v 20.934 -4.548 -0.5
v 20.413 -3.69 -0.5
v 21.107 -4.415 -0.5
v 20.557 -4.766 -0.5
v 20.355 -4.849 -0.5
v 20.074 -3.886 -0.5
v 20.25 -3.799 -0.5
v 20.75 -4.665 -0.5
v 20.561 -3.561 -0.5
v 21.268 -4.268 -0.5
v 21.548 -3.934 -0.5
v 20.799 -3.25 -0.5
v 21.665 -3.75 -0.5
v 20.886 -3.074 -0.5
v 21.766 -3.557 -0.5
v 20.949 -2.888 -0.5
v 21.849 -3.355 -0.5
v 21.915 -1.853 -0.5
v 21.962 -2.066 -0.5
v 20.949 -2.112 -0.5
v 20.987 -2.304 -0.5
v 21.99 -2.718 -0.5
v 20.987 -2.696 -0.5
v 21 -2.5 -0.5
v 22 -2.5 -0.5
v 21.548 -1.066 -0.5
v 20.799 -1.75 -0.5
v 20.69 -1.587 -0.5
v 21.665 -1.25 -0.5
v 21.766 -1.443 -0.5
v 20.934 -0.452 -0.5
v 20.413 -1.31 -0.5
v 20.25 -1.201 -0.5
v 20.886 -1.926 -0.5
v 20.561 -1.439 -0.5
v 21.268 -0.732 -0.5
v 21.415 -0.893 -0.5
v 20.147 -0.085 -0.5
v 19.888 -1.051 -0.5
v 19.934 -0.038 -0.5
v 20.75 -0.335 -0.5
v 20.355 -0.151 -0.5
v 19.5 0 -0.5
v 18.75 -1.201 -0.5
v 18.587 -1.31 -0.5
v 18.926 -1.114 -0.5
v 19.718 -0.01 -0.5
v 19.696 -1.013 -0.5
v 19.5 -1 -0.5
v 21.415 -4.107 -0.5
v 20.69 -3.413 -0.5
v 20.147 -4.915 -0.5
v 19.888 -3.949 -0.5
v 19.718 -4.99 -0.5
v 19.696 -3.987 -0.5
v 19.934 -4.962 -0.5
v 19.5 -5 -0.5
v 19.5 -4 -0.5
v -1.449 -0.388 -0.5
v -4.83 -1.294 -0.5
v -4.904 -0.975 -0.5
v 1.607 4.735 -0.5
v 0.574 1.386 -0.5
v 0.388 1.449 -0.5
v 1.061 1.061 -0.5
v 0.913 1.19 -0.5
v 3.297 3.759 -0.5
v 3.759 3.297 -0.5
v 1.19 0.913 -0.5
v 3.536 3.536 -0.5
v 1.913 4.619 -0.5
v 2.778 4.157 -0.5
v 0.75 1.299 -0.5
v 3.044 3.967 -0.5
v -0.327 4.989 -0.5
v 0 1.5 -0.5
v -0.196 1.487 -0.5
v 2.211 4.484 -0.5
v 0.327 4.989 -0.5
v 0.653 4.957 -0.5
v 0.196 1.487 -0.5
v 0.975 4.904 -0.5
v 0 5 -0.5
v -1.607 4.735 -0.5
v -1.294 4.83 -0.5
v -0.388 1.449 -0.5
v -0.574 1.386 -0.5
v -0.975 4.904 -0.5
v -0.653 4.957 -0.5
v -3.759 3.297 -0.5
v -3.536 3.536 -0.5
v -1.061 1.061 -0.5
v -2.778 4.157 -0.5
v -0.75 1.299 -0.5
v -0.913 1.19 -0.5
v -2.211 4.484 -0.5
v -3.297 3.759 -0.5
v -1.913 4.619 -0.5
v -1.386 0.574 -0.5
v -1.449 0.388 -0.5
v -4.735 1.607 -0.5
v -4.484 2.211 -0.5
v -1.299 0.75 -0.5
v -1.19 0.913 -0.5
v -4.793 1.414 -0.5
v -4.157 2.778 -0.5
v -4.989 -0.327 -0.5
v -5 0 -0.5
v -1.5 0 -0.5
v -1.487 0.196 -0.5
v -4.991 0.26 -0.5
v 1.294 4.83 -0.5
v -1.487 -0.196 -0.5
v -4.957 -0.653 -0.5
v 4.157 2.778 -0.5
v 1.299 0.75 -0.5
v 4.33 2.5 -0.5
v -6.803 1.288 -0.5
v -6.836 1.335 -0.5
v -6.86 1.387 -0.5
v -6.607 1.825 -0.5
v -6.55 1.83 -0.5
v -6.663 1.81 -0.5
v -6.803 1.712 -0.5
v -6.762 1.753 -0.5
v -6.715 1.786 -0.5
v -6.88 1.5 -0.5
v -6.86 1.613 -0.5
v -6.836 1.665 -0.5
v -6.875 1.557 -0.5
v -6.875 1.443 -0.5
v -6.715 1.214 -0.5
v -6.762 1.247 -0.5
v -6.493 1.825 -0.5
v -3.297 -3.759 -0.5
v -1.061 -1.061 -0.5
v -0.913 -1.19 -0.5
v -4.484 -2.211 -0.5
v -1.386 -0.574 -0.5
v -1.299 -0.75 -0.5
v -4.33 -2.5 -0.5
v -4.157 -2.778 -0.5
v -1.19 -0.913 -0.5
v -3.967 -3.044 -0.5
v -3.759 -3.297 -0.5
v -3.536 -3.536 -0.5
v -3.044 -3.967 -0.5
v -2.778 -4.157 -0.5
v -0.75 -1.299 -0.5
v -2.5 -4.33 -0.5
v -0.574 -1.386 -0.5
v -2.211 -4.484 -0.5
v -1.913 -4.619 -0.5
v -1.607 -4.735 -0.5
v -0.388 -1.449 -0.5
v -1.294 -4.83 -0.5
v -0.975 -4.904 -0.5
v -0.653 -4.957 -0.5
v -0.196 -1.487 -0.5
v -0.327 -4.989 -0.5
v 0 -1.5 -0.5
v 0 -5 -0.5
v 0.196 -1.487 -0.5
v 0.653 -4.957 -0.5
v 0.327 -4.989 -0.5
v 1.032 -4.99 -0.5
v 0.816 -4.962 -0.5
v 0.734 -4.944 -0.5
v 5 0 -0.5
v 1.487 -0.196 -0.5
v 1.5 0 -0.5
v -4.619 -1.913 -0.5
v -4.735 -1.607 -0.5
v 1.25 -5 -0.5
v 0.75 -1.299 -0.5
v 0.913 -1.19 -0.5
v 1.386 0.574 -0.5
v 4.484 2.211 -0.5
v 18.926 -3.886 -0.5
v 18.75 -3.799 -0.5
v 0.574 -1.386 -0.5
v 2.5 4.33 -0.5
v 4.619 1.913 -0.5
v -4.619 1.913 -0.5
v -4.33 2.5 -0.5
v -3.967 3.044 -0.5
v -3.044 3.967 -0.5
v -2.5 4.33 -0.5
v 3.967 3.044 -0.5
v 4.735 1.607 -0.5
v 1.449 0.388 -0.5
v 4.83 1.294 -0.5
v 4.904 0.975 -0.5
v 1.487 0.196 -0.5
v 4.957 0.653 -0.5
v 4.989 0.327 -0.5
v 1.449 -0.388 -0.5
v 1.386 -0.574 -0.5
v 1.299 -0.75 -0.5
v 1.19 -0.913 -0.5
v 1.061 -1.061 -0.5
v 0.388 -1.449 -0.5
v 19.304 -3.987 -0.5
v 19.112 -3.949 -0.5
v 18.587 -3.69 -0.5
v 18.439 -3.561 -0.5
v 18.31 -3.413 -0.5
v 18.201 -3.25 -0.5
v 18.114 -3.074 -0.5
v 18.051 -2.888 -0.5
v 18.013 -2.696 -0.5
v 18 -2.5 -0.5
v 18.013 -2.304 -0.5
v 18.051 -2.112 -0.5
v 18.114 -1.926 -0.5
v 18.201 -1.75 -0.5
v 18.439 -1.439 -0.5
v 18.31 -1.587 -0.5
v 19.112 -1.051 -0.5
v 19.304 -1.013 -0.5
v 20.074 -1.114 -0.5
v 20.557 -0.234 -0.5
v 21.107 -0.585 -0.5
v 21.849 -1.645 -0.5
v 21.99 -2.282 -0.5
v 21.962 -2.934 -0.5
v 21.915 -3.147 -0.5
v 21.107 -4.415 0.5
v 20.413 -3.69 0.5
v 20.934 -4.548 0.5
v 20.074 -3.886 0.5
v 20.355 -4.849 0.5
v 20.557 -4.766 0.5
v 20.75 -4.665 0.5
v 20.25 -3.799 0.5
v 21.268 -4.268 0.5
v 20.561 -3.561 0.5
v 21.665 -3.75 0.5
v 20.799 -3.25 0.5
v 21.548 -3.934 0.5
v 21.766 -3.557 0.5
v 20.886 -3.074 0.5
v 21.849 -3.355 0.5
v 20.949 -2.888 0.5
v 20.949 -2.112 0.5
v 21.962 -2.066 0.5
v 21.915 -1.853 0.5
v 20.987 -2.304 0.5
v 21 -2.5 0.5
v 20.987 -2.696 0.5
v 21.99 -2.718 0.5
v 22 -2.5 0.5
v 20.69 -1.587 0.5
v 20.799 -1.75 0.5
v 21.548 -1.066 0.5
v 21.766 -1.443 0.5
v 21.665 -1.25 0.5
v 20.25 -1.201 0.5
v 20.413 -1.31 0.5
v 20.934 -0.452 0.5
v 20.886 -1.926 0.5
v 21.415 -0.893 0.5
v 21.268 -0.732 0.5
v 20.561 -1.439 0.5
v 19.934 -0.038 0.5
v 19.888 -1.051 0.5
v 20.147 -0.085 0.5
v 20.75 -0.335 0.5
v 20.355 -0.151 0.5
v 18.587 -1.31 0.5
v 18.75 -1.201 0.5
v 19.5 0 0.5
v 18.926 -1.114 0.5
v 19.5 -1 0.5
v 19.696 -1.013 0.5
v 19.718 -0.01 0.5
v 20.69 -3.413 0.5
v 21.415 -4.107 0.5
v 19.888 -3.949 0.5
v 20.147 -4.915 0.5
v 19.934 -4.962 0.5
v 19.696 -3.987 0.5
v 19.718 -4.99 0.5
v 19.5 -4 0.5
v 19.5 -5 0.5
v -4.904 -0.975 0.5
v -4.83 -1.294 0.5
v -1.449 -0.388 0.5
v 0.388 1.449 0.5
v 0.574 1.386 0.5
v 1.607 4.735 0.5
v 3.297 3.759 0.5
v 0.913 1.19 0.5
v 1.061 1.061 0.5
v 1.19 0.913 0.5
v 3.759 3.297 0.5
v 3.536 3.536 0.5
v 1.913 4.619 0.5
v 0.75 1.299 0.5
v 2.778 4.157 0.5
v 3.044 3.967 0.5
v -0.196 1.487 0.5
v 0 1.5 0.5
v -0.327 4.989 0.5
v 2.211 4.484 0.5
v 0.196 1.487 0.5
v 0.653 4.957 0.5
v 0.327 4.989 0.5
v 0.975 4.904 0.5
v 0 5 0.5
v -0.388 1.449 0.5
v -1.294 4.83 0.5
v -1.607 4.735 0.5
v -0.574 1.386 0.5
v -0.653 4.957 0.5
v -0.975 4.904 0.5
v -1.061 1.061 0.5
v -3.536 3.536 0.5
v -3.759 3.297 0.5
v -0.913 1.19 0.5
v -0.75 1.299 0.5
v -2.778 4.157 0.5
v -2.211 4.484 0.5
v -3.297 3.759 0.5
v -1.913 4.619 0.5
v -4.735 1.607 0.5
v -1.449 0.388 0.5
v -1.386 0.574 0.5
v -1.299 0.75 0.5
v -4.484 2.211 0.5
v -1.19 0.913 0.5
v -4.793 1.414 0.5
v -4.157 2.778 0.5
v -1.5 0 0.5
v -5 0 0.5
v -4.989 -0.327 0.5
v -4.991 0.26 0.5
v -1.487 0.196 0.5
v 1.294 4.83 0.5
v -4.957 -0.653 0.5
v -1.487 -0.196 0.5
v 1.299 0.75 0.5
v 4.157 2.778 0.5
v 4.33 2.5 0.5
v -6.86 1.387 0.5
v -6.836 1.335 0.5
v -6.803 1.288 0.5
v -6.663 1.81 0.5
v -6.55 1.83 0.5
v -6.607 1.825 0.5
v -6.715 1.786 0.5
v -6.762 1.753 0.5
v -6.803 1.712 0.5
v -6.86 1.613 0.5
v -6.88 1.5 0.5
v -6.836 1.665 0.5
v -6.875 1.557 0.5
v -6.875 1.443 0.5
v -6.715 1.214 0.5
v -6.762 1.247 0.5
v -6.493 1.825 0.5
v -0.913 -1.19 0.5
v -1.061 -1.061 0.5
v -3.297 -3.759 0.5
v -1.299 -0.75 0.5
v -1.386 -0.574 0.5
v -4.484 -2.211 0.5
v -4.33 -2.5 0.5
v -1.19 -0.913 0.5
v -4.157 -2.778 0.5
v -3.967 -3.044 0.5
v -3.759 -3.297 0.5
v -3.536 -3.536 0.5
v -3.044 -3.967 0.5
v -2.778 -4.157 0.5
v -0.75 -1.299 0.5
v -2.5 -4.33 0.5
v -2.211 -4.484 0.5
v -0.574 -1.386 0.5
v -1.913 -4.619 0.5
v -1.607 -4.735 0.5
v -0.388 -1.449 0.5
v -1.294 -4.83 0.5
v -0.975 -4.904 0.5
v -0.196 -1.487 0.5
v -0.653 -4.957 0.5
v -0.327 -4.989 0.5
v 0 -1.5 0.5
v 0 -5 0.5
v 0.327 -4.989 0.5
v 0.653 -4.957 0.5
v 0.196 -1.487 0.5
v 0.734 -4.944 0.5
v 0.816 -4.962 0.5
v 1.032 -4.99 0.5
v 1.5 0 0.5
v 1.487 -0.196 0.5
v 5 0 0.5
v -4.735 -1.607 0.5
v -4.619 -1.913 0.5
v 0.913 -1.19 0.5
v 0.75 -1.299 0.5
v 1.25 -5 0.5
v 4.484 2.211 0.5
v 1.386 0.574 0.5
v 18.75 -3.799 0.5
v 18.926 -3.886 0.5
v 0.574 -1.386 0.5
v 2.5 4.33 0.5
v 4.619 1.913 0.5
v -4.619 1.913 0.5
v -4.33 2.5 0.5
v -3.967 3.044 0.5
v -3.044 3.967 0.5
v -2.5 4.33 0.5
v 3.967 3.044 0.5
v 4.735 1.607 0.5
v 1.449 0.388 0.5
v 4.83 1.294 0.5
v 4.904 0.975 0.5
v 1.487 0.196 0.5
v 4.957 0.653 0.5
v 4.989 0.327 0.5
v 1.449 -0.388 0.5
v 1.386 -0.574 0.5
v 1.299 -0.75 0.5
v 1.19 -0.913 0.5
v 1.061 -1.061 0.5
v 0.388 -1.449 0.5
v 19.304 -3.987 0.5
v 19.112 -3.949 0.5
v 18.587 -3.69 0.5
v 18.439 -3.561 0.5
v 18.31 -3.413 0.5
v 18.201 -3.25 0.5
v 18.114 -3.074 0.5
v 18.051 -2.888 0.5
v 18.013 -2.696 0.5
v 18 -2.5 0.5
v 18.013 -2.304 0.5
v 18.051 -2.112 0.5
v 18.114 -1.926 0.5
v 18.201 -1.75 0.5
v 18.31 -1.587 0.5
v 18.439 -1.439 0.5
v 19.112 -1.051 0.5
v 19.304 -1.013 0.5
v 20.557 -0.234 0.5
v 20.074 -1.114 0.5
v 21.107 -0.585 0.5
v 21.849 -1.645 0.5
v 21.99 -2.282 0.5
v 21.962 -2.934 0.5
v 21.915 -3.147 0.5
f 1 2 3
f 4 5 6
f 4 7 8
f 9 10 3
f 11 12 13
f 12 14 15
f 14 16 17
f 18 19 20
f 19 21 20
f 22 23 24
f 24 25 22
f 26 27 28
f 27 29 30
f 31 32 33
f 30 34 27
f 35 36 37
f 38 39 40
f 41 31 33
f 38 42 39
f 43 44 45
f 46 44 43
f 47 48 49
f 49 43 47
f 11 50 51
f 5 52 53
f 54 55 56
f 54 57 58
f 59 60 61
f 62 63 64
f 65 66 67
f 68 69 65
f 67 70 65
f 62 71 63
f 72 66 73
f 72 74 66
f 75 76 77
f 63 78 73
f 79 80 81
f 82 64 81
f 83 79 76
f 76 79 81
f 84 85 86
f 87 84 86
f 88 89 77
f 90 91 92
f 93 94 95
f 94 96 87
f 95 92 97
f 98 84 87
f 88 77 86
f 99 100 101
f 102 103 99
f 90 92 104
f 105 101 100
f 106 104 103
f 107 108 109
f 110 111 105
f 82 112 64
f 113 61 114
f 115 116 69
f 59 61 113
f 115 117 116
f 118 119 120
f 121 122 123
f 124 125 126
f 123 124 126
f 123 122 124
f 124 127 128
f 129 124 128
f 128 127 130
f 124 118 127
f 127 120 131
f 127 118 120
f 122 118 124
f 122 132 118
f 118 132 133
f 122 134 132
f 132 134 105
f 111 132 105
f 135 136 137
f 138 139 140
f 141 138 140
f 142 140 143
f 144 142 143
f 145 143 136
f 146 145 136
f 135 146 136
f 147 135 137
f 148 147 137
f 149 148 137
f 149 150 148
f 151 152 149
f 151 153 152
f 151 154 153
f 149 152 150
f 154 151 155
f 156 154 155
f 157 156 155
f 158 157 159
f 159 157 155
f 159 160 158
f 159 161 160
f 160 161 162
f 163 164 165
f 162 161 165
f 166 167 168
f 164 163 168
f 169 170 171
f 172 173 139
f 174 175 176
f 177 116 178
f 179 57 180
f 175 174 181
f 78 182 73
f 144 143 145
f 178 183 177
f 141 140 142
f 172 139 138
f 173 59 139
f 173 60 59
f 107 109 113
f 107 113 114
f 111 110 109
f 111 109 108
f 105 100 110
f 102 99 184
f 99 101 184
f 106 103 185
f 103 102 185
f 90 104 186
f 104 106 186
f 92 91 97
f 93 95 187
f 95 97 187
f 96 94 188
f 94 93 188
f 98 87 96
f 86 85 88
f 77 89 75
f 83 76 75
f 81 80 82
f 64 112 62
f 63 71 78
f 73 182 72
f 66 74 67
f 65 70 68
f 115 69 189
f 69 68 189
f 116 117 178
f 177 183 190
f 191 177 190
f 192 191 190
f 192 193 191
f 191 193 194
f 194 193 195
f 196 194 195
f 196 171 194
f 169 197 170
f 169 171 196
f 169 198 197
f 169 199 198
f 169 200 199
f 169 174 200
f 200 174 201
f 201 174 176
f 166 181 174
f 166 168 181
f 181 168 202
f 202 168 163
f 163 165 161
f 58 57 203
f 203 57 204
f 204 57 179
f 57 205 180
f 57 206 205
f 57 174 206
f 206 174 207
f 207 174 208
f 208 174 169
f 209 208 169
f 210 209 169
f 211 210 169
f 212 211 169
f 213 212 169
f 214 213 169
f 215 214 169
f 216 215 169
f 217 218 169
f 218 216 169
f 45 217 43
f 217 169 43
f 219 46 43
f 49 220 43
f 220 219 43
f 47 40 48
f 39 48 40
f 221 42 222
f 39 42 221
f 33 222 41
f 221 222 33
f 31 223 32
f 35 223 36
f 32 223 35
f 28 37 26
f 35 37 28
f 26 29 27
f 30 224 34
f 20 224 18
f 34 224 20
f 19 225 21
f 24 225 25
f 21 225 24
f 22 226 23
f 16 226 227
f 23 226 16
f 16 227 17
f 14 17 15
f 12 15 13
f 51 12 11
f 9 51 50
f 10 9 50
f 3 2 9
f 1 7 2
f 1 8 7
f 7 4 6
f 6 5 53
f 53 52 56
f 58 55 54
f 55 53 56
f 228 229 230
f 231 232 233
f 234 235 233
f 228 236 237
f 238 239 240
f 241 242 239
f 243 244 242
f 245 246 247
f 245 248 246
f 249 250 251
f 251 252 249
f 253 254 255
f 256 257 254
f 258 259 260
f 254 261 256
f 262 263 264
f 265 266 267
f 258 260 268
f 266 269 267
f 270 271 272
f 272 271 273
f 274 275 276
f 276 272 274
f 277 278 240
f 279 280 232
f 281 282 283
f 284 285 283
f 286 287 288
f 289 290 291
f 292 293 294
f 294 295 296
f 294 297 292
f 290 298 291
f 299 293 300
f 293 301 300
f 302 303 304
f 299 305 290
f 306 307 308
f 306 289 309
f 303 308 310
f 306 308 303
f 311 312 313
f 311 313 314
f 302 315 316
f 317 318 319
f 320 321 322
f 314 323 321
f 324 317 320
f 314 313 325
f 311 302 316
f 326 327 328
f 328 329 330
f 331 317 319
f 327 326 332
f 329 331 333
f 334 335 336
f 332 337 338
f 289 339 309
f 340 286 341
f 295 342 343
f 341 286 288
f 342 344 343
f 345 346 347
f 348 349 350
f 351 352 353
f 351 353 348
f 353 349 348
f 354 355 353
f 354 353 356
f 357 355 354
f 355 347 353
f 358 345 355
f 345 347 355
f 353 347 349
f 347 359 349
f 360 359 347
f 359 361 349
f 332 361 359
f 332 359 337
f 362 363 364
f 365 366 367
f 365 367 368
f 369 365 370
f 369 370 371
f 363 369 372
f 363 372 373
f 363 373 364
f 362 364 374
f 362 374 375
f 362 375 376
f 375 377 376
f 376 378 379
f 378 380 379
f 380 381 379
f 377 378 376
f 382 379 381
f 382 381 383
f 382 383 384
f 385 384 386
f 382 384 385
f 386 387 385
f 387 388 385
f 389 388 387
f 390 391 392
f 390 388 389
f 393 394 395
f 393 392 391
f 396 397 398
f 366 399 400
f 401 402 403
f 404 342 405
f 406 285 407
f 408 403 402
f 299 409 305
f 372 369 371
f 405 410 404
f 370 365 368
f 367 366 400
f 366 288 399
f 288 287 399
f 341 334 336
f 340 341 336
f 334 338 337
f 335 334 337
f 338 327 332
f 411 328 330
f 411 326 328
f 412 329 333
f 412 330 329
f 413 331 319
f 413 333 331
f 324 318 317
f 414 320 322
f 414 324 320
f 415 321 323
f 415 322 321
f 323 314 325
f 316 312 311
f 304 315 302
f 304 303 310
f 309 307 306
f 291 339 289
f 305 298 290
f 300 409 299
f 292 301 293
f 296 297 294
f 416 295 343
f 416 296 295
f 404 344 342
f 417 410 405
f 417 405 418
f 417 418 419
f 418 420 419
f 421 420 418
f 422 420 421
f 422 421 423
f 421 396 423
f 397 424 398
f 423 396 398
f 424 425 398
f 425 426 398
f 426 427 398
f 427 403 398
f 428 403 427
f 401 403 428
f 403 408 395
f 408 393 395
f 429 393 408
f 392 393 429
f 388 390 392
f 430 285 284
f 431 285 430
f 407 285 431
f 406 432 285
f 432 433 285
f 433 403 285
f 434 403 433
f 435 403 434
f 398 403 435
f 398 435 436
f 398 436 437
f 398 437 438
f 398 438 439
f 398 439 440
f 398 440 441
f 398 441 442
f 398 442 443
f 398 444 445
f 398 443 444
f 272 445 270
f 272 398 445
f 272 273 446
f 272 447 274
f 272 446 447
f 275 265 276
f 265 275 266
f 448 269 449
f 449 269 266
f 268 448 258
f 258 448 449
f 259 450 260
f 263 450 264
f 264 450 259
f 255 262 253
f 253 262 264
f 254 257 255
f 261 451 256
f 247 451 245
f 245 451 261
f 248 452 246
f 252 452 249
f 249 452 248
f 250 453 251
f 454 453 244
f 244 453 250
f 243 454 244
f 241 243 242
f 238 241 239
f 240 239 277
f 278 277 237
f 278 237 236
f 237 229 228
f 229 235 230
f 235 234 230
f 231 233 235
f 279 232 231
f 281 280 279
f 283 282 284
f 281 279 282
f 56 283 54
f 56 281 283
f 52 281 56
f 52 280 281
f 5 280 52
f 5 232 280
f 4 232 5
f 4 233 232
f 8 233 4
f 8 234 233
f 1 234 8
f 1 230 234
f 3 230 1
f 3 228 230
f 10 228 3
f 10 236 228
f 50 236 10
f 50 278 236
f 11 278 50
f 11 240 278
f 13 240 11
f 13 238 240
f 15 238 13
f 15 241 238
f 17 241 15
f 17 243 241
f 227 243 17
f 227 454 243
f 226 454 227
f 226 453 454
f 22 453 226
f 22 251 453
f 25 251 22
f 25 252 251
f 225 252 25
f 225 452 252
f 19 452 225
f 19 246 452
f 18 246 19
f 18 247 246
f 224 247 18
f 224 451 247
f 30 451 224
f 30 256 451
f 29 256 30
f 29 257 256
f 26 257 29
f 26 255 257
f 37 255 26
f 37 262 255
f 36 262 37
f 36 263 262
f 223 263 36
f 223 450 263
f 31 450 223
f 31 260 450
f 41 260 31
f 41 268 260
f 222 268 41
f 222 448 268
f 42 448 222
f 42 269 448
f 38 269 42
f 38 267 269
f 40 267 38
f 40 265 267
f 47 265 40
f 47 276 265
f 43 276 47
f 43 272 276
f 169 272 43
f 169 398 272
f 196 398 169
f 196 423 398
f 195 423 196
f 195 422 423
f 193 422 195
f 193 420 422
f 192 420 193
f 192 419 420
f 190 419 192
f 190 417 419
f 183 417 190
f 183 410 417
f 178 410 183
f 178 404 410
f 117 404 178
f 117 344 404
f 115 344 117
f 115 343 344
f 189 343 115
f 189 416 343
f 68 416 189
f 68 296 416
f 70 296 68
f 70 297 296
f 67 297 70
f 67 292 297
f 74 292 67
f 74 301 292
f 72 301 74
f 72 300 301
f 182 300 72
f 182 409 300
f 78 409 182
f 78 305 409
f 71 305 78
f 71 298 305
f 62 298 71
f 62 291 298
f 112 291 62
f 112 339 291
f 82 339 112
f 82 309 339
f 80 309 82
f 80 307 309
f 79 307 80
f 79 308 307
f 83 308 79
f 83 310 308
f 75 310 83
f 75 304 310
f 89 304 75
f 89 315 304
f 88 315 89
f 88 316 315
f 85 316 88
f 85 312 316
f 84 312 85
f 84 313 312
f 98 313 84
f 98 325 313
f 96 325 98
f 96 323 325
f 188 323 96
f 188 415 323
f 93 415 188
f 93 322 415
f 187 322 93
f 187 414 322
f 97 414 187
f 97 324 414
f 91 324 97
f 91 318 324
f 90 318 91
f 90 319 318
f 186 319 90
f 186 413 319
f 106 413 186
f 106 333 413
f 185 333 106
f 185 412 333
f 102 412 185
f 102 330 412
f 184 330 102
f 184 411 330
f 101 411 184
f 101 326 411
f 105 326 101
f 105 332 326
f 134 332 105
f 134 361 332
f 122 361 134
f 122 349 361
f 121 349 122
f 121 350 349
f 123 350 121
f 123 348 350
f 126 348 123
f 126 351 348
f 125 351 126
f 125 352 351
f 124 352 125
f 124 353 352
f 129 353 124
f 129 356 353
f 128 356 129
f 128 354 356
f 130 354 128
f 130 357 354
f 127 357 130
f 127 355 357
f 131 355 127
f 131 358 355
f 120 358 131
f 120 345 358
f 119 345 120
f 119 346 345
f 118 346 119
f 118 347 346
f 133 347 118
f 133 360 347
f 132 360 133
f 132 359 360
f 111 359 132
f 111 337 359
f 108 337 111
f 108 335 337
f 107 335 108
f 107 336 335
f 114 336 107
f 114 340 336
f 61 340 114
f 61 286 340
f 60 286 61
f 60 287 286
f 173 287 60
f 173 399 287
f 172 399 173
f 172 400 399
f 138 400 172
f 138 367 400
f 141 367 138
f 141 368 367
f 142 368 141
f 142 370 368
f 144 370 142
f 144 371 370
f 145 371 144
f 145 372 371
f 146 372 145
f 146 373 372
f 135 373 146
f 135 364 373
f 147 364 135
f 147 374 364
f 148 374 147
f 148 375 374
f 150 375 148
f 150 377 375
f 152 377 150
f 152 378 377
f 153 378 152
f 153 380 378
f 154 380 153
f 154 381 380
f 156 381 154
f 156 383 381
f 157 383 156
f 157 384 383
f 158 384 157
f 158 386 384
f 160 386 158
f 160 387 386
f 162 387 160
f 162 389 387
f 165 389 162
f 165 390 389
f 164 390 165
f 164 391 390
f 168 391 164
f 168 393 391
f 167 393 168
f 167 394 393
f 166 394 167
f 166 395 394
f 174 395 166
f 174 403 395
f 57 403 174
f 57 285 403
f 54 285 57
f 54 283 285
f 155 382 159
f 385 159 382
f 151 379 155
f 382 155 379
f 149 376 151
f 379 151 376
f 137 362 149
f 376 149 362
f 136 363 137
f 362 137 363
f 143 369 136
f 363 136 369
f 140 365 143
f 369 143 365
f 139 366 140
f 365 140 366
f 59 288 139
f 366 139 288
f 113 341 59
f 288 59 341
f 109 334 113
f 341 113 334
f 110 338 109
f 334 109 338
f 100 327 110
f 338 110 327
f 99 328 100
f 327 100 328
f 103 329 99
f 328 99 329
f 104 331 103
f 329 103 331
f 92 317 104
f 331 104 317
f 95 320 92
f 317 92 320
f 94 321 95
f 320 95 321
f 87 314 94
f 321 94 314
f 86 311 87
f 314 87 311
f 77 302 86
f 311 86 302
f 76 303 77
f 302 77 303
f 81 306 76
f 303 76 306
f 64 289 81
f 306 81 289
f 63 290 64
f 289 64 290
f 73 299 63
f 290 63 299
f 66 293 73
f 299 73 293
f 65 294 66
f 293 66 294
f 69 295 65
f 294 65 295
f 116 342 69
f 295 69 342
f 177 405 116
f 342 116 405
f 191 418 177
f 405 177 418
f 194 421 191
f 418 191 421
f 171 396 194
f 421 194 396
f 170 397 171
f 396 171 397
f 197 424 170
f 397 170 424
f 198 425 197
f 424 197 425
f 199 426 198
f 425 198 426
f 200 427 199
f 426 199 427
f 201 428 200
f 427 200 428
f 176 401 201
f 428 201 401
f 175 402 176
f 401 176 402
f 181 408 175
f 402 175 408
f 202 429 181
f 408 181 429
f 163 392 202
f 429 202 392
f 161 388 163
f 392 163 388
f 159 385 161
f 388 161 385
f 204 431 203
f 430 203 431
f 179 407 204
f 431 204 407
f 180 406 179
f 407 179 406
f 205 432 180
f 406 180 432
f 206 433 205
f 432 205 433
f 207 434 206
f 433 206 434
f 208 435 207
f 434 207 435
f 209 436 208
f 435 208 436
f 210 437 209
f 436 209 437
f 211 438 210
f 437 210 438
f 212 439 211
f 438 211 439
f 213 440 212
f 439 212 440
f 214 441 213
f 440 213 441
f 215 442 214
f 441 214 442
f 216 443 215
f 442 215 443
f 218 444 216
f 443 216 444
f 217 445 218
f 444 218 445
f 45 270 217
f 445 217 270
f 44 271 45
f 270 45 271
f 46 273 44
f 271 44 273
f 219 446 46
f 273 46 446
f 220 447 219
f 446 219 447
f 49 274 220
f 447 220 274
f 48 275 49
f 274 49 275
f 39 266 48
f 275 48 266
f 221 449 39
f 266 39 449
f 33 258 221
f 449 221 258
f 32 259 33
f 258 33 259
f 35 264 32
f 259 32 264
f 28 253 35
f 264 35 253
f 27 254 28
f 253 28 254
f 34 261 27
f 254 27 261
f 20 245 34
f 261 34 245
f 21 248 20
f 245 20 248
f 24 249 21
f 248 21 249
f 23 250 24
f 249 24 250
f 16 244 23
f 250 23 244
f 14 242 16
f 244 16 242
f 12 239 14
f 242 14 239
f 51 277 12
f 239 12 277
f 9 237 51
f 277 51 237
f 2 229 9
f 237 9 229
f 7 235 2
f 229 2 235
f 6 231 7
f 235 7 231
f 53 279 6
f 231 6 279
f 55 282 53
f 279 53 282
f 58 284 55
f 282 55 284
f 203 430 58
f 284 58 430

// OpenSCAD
// Part A12: link plate with two holes and tapered tongue.
// SPDX-License-Identifier: MIT
//
// Local origin convention:
// - XY origin is the center of the larger left eye.
// - Z origin is the plate midplane.
// - Assembly placement and animation should be applied outside this file.

// 2D profile based on DRW-001 sheet 5 callouts:
// - left eye outer R5 with center hole d=3
// - right eye outer R2.5 with center hole d=3
// - center spacing between holes = 19.5
// - left tongue thickness ~1.5 and reach ~7 from left eye center
// - upper transition uses a tighter shoulder (R4.5 style) than lower contour
module a12_profile_2d(
    c2c = 19.5,
    r_left = 5.0,
    r_right = 2.5,
    hole_d = 3.0,
    tongue_len = 7.0,
    tongue_th = 1.5,
    neck_x = 4.25,
    shoulder_r = 4.5,
    offset = 2.5
) {
    difference() {
        union() {
            // Main link bar with right rounded eye.
            hull() {
                translate([neck_x-3, -offset]) circle(r = r_right, $fn = 72);
                translate([c2c, -offset]) circle(r = r_right, $fn = 72);
            }

            // Left large eye (lower contour remains full R5).
            translate([0, 0]) circle(r = r_left, $fn = 96);

            // Upper shoulder blend (R4.5-style transition).
            // Shifted upward slightly so the top contour is tighter than the lower lobe.
//            translate([0.7, 0.82]) circle(r = shoulder_r, $fn = 96);

            // Left tongue/tab with asymmetric taper to better match the drawing silhouette.
            hull() { 
                translate([-tongue_len + 0.45, tongue_th]) circle(r = tongue_th * 0.22, $fn = 36);
                translate([-3.05,  0.56]) circle(r = tongue_th * 0.28, $fn = 44);
                translate([-2.65, -0.42]) circle(r = tongue_th * 0.36, $fn = 44);
            }
        }

        translate([0, 0]) circle(d = hole_d, $fn = 48);
        translate([c2c, -offset]) circle(d = hole_d, $fn = 48);
    }
}

module part_a12(
    th = 1.0,
    c2c = 19.5,
    offset = 2.5
) {
    translate([0, 0, -th / 2])
        linear_extrude(height = th)
            a12_profile_2d(c2c = c2c, offset = offset);
}

// ---- "main guard" ----
// Default to previewing when opened directly:
if (is_undef(__LIB_MODE__)) {
    part_a12();
}
